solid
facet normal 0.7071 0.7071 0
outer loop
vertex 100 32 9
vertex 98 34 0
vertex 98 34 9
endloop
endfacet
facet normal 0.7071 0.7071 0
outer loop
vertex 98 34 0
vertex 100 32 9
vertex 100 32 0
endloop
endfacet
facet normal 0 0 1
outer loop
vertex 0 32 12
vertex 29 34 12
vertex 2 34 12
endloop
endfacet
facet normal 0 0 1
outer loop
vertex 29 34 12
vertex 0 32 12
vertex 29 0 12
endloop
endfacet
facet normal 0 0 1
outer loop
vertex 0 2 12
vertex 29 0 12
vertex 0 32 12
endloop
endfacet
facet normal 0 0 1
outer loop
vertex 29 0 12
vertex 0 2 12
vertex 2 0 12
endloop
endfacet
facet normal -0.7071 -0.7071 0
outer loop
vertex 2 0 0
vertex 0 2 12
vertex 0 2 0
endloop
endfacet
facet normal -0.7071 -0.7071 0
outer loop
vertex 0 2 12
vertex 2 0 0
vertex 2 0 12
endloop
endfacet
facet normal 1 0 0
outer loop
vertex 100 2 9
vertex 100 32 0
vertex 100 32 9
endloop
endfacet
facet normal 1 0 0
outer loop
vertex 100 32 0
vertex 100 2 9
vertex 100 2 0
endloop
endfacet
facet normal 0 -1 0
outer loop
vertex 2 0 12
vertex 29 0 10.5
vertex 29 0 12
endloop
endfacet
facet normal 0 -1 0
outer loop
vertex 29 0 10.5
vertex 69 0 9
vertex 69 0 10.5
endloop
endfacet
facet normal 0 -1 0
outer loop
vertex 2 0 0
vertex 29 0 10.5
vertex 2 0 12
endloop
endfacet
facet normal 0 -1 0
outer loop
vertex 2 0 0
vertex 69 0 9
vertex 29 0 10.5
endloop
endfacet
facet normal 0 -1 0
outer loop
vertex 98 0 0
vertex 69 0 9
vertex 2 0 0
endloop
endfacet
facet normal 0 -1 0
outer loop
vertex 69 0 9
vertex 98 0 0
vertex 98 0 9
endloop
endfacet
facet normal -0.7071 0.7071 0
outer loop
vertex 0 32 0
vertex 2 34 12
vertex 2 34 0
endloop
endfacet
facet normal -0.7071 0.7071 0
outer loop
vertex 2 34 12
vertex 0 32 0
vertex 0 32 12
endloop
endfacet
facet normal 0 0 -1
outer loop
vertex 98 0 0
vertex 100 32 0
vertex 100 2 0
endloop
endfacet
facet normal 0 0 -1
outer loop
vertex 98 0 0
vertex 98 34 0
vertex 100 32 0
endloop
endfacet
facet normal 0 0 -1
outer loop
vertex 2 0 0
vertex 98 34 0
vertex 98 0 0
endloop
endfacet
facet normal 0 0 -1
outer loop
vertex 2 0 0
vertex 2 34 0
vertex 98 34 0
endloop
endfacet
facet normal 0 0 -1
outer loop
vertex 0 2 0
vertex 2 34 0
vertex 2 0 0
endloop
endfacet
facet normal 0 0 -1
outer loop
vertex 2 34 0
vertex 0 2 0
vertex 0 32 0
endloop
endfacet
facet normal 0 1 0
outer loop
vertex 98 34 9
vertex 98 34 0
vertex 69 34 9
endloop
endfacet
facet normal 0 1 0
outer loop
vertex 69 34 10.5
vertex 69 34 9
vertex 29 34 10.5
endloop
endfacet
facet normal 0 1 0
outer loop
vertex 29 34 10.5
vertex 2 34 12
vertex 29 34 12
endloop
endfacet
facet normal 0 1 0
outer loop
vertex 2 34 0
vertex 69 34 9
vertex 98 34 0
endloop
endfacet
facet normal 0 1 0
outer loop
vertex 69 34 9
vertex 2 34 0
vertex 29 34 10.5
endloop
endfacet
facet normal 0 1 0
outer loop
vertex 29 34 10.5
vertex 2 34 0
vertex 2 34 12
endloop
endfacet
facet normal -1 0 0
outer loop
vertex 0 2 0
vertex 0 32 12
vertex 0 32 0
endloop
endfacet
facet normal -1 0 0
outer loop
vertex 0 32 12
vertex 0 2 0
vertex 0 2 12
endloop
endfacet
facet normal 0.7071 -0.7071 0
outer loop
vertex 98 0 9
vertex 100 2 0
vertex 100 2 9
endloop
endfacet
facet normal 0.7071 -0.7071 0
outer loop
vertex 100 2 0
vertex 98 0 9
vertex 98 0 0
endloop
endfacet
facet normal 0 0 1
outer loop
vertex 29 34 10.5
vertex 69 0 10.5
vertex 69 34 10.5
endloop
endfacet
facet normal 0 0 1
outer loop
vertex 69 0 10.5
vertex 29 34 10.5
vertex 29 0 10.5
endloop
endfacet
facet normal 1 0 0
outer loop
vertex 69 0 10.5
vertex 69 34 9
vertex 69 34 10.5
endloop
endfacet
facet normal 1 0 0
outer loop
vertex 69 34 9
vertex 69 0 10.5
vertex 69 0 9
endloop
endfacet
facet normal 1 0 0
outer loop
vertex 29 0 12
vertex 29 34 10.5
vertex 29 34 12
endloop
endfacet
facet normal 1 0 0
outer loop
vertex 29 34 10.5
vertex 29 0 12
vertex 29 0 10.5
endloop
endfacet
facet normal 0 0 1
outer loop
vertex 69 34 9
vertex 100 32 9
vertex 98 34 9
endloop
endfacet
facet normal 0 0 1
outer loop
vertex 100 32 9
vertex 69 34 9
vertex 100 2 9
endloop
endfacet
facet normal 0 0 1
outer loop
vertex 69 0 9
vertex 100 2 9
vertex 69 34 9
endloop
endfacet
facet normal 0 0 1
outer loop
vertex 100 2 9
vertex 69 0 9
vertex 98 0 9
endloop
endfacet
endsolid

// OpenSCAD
$fn = 32;

// ----------------------------------------------------------------------
// Stepped bar: twostep, 100 x 34 x 12/9 mm
// ----------------------------------------------------------------------

// --- parameters (mm) ---
bar_l = 100;              // bar length, X
bar_w = 34;               // bar width, Y
plate_t = 12;             // thickness of the thick zone, Z
thin_t = 9;               // thickness of the thin zone
corner_c = 2;             // corner chamfer of the bar
step_cut = 3;             // material removed from the thin zone
stair1_x = 29;            // position of the first stair
stair2_x = 69;            // position of the second stair
mid_t = 10.5;             // thickness of the middle zone
depth_1 = 1.5;            // depth of cut 1 from the top face
depth_2 = 3;              // depth of cut 2 from the top face

profile = [[2, 0], [98, 0], [100, 2], [100, 32], [98, 34], [2, 34], [0, 32], [0, 2]];  // primary outline, 8 points, counter clockwise
void_1 = [[29, -1], [69, -1], [69, 35], [29, 35]];  // first stair, 4 points
void_2 = [[69, -1], [101, -1], [101, 35], [69, 35]];  // second stair, 4 points

// --- the one profile operation ---
difference() {
  linear_extrude(height = plate_t) polygon(points = profile);
  translate([0, 0, plate_t - depth_1])
    linear_extrude(height = depth_1 + 1) polygon(points = void_1);
  translate([0, 0, plate_t - depth_2])
    linear_extrude(height = depth_2 + 1) polygon(points = void_2);
}
